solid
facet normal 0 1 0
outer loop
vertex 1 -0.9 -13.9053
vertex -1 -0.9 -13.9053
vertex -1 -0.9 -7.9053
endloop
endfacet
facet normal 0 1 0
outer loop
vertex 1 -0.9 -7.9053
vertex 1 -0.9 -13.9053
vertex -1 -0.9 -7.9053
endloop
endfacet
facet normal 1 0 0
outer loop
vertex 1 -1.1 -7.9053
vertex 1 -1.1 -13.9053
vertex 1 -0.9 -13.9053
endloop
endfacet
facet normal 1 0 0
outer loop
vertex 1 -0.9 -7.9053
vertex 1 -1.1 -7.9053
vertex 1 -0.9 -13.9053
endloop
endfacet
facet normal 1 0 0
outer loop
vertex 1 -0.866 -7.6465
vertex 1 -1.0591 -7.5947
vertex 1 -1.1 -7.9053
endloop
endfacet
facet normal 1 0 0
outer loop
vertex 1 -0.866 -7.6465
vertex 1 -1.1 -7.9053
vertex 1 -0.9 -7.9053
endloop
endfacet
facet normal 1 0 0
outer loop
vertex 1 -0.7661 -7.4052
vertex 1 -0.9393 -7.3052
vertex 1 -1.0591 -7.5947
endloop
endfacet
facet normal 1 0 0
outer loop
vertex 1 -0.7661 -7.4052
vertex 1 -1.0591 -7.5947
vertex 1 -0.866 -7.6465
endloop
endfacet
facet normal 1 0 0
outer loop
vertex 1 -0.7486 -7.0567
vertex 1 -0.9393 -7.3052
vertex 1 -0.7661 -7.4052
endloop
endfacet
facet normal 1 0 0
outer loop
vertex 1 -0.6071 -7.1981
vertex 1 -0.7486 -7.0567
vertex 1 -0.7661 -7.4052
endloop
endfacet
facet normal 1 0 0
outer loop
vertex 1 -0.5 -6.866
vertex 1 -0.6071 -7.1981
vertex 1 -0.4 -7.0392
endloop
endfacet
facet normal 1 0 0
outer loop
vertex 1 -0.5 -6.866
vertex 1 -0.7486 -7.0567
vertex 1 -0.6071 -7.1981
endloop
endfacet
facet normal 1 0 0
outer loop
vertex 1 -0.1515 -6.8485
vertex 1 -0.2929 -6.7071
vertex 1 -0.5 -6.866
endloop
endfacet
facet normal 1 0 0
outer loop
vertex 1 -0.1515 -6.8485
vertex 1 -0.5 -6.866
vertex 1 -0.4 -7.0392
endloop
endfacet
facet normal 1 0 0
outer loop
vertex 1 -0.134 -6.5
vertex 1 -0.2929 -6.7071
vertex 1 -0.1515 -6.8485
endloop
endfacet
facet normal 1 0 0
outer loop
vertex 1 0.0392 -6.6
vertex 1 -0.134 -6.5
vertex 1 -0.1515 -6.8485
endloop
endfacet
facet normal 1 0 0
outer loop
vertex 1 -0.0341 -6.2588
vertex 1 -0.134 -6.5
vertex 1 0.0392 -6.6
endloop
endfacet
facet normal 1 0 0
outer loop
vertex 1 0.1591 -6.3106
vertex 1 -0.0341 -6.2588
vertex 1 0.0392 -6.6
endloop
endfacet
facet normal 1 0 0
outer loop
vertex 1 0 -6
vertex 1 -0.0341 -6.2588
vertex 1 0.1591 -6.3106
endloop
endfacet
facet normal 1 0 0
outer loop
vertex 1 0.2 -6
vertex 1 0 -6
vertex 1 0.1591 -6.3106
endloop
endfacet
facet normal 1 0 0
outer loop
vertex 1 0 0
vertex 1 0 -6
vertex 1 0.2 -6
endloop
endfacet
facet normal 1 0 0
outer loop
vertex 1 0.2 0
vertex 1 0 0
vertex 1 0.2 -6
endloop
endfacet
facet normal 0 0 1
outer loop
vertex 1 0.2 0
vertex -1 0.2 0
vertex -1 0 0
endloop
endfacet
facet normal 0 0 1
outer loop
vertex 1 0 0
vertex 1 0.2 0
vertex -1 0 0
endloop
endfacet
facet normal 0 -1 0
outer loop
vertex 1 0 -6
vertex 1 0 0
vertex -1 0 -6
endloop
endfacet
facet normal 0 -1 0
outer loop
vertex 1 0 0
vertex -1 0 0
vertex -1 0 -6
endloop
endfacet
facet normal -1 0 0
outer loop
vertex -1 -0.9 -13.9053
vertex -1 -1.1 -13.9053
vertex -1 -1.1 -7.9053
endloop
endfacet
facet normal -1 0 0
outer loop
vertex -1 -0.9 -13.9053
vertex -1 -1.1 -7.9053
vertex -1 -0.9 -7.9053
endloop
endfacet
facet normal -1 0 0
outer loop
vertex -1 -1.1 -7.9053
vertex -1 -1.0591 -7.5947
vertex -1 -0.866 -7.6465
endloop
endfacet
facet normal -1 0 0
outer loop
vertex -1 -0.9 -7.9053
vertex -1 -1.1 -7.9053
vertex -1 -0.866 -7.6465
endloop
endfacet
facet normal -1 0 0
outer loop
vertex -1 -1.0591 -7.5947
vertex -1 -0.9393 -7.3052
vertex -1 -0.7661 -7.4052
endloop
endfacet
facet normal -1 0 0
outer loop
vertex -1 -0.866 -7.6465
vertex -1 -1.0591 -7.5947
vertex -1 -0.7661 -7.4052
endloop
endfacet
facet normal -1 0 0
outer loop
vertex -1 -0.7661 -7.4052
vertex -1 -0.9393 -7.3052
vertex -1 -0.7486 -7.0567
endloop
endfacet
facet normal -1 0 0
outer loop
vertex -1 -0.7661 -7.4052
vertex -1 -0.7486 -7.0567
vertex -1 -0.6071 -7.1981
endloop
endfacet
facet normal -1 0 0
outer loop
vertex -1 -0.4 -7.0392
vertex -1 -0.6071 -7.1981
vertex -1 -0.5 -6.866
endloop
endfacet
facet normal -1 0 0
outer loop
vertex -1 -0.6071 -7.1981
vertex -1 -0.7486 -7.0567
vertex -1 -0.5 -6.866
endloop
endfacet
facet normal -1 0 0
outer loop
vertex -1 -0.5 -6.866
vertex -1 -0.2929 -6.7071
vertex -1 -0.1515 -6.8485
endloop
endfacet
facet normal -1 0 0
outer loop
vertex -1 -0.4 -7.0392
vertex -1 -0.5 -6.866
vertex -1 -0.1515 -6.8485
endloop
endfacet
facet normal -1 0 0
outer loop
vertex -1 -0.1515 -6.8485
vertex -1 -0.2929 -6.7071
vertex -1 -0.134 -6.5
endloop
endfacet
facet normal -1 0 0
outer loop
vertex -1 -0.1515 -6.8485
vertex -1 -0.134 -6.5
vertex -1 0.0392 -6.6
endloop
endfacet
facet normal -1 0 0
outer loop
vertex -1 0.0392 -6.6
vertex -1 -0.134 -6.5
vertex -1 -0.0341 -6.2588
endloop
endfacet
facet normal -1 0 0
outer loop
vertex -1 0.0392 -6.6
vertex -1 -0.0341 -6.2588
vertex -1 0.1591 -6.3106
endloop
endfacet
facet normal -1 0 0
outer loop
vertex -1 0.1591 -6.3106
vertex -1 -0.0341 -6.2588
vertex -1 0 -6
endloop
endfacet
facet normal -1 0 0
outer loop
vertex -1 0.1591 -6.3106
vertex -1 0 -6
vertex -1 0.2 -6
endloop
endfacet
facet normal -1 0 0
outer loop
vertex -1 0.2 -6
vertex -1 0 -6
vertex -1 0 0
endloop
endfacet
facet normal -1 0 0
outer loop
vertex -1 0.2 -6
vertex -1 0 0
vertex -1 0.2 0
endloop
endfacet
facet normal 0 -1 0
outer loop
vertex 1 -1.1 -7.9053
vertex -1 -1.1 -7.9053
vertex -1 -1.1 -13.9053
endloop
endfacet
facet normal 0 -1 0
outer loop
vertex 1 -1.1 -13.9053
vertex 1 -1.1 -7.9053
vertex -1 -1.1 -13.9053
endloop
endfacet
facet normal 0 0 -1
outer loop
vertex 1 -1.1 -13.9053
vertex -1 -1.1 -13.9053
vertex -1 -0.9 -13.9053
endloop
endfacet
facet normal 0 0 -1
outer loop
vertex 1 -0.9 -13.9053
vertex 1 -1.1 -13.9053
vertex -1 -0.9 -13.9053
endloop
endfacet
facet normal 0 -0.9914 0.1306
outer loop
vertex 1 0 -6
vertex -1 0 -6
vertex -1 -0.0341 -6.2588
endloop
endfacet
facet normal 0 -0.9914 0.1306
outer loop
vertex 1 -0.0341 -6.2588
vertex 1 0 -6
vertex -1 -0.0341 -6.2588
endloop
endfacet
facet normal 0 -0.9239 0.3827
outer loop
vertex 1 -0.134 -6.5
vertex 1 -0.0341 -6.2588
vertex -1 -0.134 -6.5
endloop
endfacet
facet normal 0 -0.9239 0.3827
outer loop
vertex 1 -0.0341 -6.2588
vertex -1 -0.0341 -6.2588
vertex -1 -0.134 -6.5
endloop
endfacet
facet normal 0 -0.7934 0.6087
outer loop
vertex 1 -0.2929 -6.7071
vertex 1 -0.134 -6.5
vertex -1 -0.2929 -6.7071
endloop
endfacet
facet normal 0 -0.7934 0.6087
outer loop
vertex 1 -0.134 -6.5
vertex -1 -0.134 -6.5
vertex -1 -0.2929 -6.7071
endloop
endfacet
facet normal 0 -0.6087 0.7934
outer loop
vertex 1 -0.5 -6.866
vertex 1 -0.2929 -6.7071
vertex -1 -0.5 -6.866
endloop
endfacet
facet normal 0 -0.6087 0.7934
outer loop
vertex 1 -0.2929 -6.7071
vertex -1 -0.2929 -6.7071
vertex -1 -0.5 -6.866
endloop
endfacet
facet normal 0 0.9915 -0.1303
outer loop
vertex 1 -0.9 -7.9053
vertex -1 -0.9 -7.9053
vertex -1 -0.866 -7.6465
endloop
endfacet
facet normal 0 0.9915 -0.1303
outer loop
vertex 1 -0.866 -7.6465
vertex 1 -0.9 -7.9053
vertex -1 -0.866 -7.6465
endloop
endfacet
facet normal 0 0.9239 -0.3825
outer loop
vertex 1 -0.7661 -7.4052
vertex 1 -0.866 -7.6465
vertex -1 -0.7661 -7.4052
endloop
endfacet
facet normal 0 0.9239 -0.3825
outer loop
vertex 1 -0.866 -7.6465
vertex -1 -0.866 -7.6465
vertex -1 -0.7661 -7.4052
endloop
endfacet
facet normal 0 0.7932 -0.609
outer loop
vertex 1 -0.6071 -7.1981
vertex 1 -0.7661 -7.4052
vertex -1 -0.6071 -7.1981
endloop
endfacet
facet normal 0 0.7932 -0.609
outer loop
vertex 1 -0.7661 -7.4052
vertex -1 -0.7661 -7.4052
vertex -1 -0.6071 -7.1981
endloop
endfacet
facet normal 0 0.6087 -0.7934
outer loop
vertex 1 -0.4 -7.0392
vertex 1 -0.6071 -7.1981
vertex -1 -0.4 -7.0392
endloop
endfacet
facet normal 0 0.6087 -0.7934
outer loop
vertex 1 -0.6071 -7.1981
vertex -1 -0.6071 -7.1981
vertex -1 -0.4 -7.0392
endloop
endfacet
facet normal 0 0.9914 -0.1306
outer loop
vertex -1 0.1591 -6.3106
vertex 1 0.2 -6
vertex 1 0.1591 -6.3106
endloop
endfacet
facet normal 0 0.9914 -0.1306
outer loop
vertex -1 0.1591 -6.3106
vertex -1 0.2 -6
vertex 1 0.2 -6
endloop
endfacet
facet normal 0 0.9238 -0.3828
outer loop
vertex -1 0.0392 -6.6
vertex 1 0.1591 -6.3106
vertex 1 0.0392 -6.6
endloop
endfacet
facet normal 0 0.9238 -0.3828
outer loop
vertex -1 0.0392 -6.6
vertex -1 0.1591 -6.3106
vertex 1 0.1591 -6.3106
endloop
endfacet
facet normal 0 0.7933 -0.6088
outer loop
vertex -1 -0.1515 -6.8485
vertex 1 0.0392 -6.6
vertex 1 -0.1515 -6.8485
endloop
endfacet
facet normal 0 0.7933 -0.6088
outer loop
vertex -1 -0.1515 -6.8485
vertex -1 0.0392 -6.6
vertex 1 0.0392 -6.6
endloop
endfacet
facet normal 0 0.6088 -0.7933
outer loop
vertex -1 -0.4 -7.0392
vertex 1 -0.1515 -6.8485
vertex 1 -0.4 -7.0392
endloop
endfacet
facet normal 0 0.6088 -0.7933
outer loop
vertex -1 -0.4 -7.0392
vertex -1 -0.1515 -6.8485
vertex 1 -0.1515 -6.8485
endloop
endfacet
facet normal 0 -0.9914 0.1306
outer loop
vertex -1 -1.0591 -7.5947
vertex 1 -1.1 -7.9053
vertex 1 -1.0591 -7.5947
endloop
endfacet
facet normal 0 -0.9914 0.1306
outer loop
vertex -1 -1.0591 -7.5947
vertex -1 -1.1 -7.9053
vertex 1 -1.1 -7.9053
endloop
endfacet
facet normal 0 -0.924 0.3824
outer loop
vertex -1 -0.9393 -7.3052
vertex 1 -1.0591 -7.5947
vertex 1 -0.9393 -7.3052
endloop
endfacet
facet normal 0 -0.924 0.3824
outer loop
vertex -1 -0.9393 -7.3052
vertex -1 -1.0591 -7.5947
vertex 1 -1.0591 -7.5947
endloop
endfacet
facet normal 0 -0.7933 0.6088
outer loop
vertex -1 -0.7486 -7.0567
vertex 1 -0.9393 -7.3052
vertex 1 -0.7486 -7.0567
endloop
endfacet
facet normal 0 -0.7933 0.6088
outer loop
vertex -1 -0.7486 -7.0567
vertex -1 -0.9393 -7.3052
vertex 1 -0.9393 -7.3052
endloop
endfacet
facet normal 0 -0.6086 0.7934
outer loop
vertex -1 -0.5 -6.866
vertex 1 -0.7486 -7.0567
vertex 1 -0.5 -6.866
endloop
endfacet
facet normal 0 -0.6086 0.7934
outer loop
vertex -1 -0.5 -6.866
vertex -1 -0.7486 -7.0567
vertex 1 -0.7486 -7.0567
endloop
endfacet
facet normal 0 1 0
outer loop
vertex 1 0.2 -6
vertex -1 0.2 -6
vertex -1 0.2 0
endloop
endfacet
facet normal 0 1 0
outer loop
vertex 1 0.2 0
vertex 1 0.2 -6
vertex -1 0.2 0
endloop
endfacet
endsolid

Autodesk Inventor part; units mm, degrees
ref_plane "YZ Plane" through (0, 0, 0) normal (1, 0, 0) x (0, 1, 0)
ref_plane "XZ Plane" through (0, 0, 0) normal (0, 1, 0) x (-1, 0, 0)
ref_plane "XY Plane" through (0, 0, 0) normal (0, 0, 1) x (1, 0, 0)
sketch "Sketch1" plane through (0, 0, 0) normal (1, 0, 0) x (0, 1, 0)
  line L0 (0, 0) -> (0, -6)
  arc A0 (-0.5, -6.866) -> (0, -6) centre (-1, -6) ccw
  arc A1 (-0.5, -6.866) -> (-1.1, -7.9053) centre (0.1, -7.9053) ccw
  line L1 (-1.1, -7.9053) -> (-1.1, -13.9053)
  line L2 (-1.1, -13.9053) -> (-0.9, -13.9053)
  line L3 (-0.9, -13.9053) -> (-0.9, -7.9053)
  arc A2 (-0.4, -7.0392) -> (-0.9, -7.9053) centre (0.1, -7.9053) ccw
  arc A3 (-0.4, -7.0392) -> (0.2, -6) centre (-1, -6) ccw
  line L4 (0.2, -6) -> (0.2, 0)
  line L5 (0.2, 0) -> (0, 0)
  dimension "d0" = 0.2
  dimension "d1" = 6
  dimension "d2" = 6
  dimension "d3" = 1.1
  dimension "d4" = 1
extrude "Extrusion1" add sketch "Sketch1" along normal mid plane 2
properties part number "SolarPanel_CellJumper" material "Nickel-Copper Alloy 400"
